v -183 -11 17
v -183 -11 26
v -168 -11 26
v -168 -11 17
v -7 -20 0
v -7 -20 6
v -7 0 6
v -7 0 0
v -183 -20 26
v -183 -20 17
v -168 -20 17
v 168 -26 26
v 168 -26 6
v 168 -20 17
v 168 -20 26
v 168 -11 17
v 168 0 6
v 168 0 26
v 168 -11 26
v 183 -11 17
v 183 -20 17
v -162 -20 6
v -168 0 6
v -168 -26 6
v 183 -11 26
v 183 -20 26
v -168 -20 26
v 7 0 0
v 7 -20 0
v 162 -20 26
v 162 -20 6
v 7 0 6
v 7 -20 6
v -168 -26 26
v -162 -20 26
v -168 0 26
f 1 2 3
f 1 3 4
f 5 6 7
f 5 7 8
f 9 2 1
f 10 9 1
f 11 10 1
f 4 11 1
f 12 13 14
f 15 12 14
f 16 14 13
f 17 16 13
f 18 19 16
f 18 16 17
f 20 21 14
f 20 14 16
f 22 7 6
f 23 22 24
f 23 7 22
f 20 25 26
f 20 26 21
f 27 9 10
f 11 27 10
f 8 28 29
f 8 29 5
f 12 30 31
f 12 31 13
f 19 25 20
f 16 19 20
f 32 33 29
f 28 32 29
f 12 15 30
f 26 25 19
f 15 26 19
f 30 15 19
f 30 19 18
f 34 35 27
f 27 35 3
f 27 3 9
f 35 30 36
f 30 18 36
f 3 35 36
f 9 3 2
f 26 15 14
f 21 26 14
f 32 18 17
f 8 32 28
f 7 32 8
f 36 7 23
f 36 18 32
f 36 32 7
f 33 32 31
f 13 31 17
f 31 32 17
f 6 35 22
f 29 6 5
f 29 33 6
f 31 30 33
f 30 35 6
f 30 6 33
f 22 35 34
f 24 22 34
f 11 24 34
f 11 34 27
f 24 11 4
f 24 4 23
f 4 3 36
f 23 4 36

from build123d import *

# Parameters (mm, degrees)
EXTRUDE_1_DEPTH     = 26
SKETCH_1_4_W        = 4
SKETCH_1_4_H        = 340
EXTRUDE_2_DEPTH     = 19
FILLET_1_R          = 10
EXTRUDE_3_DEPTH     = 2
SKETCH_5_W          = 161
SKETCH_5_H          = 6
CUT_EXTRUDE_1_DEPTH = 52
CUT_EXTRUDE_2_DEPTH = 72
CUT_EXTRUDE_3_DEPTH = 72
CUT_EXTRUDE_4_DEPTH = 362
SKETCH_9_W          = 9
SKETCH_9_H          = 9
EXTRUDE_4_DEPTH     = 15
EXTRUDE_5_DEPTH     = 20


with BuildPart() as part:
    # 스케치1 → 보스-돌출1 (new body)
    with BuildSketch(Plane.XY):
        Polygon((-168, 0), (168, 0), (183, 0), (183, -340), (168, -340), (168, -20), (-168, -20), (-168, -340), (-183, -340), (-183, 0), align=None)
    extrude(amount=EXTRUDE_1_DEPTH)

    # 스케치1<4> → 보스-돌출2 (add)
    with BuildSketch(Plane.XY):
        with Locations((-170, -170)):
            Rectangle(SKETCH_1_4_W, SKETCH_1_4_H)
        with Locations((170, -170)):
            Rectangle(SKETCH_1_4_W, SKETCH_1_4_H)
    extrude(amount=-EXTRUDE_2_DEPTH)

    # 필렛1
    fillet_1_edges = [part.edges().sort_by_distance(p)[0] for p in [
        (-170, 0, -19),
        (170, 0, -19),
        (170, -340, -19),
        (-170, -340, -19),
    ]]
    fillet(fillet_1_edges, radius=FILLET_1_R)

    # 스케치3 → 보스-돌출3 (add)
    with BuildSketch(Plane.ZY.offset(-168)):
        with BuildLine():
            Line((-12, -339.539392014), (-12, -0.460607986))
            ThreePointArc((-12, -0.460607986), (-13.02408013, -0.845395743), (-14, -1.339745962))
            Line((-14, -1.339745962), (-14, -338.660254038))
            ThreePointArc((-14, -338.660254038), (-13.02408013, -339.154604257), (-12, -339.539392014))
        make_face()
    extrude_3 = extrude(amount=EXTRUDE_3_DEPTH)

    # 대칭 복사1: 보스-돌출3 across plane
    add(extrude_3.mirror(Plane(origin=(0, 0, 0), x_dir=(0, 0, 1), z_dir=(1, 0, 0))))

    # 스케치5 → 컷-돌출1 (cut)
    with BuildSketch(Plane(origin=(0, 0, 0), x_dir=(1, 0, 0), z_dir=(0, 1, 0))):
        with Locations((-87.5, -3)):
            Rectangle(SKETCH_5_W, SKETCH_5_H)
        with Locations((87.5, -3)):
            Rectangle(SKETCH_5_W, SKETCH_5_H)
    extrude(amount=-CUT_EXTRUDE_1_DEPTH, mode=Mode.SUBTRACT)

    # 스케치7 → 컷-돌출2 (cut)
    with BuildSketch(Plane.ZY.offset(-168)):
        with BuildLine():
            Line((26, 0), (-9, 0))
            ThreePointArc((-9, 0), (-16.071067812, -2.928932188), (-19, -10))
            Line((-19, -10), (-19, -330))
            ThreePointArc((-19, -330), (-16.071067812, -337.071067812), (-9, -340))
            Line((-9, -340), (26, -340))
            Line((26, -340), (26, 0))
        make_face()
    extrude(amount=-CUT_EXTRUDE_2_DEPTH, mode=Mode.SUBTRACT)


with BuildPart() as cut_extrude_2_piece_1:
    # of the separate pieces the step leaves, piece 1, a body of its own (cut_extrude_2_pieces)
    add(part.part.solids().sort_by_distance((168, 0, 26))[0])

    # 스케치8 → 컷-돌출3 (cut)
    with BuildSketch(Plane(origin=(-168, 0, 0), x_dir=(0, 0, -1), z_dir=(1, 0, 0))):
        with BuildLine():
            Line((9, 0), (-26, 0))
            Line((-26, 0), (-26, -340))
            Line((-26, -340), (9, -340))
            ThreePointArc((9, -340), (10.517576993, -339.884177258), (12, -339.539392014))
            Line((12, -339.539392014), (12, -0.460607986))
            ThreePointArc((12, -0.460607986), (10.517576993, -0.115822742), (9, 0))
        make_face()
    extrude(amount=-CUT_EXTRUDE_3_DEPTH, mode=Mode.SUBTRACT)


with BuildPart() as cut_extrude_2_piece_2:
    # of the separate pieces the step leaves, piece 2, a body of its own (cut_extrude_2_pieces)
    add(part.part.solids().sort_by_distance((168, -339.539392014, -12))[0])


with BuildPart() as cut_extrude_3_piece_1:
    # of the separate pieces the step leaves, piece 1, a body of its own (cut_extrude_3_pieces)
    add(cut_extrude_2_piece_1.part.solids().sort_by_distance((-168, 0, 26))[0])

    # 스케치9 → 보스-돌출4 (add)
    with BuildSketch(Plane(origin=(168, 0, 0), x_dir=(0, 0, -1), z_dir=(1, 0, 0))):
        with Locations((-21.5, -15.5)):
            Rectangle(SKETCH_9_W, SKETCH_9_H)
    extrude_4 = extrude(amount=EXTRUDE_4_DEPTH)

    # 대칭 복사2: 보스-돌출4 across plane
    add(extrude_4.mirror(Plane(origin=(0, 0, 0), x_dir=(0, 0, 1), z_dir=(1, 0, 0))))

    # 스케치10 → 보스-돌출5 (add)
    with BuildSketch(Plane.XY.offset(26)):
        Polygon((168, -20), (162, -20), (168, -26), align=None)
    extrude_5 = extrude(amount=-EXTRUDE_5_DEPTH)

    # 대칭 복사3: 보스-돌출5 across plane
    add(extrude_5.mirror(Plane(origin=(0, 0, 0), x_dir=(0, 0, 1), z_dir=(1, 0, 0))))


with BuildPart() as cut_extrude_3_piece_2:
    # of the separate pieces the step leaves, piece 2, a body of its own (cut_extrude_3_pieces)
    add(cut_extrude_2_piece_1.part.solids().sort_by_distance((-172, -0.460607986, -12))[0])


with BuildPart() as cut_extrude_4_tool:
    # 스케치7<3> → 컷-돌출4 (new body)
    with BuildSketch(Plane.ZY.offset(-168)):
        with BuildLine():
            Line((-12, -339.539392014), (-12, -0.460607986))
            ThreePointArc((-12, -0.460607986), (-17.062257748, -4.083920217), (-19, -10))
            Line((-19, -10), (-19, -330))
            ThreePointArc((-19, -330), (-17.062257748, -335.916079783), (-12, -339.539392014))
        make_face()
    extrude(amount=CUT_EXTRUDE_4_DEPTH)


with BuildPart() as cut_extrude_2_piece_2_1:
    add(cut_extrude_2_piece_2.part)

    # 컷-돌출4: cut by cut_extrude_4_tool
    add(cut_extrude_4_tool.part, mode=Mode.SUBTRACT)


with BuildPart() as cut_extrude_3_piece_2_1:
    add(cut_extrude_3_piece_2.part)

    # 컷-돌출4: cut by cut_extrude_4_tool
    add(cut_extrude_4_tool.part, mode=Mode.SUBTRACT)


solid = cut_extrude_3_piece_1.part
